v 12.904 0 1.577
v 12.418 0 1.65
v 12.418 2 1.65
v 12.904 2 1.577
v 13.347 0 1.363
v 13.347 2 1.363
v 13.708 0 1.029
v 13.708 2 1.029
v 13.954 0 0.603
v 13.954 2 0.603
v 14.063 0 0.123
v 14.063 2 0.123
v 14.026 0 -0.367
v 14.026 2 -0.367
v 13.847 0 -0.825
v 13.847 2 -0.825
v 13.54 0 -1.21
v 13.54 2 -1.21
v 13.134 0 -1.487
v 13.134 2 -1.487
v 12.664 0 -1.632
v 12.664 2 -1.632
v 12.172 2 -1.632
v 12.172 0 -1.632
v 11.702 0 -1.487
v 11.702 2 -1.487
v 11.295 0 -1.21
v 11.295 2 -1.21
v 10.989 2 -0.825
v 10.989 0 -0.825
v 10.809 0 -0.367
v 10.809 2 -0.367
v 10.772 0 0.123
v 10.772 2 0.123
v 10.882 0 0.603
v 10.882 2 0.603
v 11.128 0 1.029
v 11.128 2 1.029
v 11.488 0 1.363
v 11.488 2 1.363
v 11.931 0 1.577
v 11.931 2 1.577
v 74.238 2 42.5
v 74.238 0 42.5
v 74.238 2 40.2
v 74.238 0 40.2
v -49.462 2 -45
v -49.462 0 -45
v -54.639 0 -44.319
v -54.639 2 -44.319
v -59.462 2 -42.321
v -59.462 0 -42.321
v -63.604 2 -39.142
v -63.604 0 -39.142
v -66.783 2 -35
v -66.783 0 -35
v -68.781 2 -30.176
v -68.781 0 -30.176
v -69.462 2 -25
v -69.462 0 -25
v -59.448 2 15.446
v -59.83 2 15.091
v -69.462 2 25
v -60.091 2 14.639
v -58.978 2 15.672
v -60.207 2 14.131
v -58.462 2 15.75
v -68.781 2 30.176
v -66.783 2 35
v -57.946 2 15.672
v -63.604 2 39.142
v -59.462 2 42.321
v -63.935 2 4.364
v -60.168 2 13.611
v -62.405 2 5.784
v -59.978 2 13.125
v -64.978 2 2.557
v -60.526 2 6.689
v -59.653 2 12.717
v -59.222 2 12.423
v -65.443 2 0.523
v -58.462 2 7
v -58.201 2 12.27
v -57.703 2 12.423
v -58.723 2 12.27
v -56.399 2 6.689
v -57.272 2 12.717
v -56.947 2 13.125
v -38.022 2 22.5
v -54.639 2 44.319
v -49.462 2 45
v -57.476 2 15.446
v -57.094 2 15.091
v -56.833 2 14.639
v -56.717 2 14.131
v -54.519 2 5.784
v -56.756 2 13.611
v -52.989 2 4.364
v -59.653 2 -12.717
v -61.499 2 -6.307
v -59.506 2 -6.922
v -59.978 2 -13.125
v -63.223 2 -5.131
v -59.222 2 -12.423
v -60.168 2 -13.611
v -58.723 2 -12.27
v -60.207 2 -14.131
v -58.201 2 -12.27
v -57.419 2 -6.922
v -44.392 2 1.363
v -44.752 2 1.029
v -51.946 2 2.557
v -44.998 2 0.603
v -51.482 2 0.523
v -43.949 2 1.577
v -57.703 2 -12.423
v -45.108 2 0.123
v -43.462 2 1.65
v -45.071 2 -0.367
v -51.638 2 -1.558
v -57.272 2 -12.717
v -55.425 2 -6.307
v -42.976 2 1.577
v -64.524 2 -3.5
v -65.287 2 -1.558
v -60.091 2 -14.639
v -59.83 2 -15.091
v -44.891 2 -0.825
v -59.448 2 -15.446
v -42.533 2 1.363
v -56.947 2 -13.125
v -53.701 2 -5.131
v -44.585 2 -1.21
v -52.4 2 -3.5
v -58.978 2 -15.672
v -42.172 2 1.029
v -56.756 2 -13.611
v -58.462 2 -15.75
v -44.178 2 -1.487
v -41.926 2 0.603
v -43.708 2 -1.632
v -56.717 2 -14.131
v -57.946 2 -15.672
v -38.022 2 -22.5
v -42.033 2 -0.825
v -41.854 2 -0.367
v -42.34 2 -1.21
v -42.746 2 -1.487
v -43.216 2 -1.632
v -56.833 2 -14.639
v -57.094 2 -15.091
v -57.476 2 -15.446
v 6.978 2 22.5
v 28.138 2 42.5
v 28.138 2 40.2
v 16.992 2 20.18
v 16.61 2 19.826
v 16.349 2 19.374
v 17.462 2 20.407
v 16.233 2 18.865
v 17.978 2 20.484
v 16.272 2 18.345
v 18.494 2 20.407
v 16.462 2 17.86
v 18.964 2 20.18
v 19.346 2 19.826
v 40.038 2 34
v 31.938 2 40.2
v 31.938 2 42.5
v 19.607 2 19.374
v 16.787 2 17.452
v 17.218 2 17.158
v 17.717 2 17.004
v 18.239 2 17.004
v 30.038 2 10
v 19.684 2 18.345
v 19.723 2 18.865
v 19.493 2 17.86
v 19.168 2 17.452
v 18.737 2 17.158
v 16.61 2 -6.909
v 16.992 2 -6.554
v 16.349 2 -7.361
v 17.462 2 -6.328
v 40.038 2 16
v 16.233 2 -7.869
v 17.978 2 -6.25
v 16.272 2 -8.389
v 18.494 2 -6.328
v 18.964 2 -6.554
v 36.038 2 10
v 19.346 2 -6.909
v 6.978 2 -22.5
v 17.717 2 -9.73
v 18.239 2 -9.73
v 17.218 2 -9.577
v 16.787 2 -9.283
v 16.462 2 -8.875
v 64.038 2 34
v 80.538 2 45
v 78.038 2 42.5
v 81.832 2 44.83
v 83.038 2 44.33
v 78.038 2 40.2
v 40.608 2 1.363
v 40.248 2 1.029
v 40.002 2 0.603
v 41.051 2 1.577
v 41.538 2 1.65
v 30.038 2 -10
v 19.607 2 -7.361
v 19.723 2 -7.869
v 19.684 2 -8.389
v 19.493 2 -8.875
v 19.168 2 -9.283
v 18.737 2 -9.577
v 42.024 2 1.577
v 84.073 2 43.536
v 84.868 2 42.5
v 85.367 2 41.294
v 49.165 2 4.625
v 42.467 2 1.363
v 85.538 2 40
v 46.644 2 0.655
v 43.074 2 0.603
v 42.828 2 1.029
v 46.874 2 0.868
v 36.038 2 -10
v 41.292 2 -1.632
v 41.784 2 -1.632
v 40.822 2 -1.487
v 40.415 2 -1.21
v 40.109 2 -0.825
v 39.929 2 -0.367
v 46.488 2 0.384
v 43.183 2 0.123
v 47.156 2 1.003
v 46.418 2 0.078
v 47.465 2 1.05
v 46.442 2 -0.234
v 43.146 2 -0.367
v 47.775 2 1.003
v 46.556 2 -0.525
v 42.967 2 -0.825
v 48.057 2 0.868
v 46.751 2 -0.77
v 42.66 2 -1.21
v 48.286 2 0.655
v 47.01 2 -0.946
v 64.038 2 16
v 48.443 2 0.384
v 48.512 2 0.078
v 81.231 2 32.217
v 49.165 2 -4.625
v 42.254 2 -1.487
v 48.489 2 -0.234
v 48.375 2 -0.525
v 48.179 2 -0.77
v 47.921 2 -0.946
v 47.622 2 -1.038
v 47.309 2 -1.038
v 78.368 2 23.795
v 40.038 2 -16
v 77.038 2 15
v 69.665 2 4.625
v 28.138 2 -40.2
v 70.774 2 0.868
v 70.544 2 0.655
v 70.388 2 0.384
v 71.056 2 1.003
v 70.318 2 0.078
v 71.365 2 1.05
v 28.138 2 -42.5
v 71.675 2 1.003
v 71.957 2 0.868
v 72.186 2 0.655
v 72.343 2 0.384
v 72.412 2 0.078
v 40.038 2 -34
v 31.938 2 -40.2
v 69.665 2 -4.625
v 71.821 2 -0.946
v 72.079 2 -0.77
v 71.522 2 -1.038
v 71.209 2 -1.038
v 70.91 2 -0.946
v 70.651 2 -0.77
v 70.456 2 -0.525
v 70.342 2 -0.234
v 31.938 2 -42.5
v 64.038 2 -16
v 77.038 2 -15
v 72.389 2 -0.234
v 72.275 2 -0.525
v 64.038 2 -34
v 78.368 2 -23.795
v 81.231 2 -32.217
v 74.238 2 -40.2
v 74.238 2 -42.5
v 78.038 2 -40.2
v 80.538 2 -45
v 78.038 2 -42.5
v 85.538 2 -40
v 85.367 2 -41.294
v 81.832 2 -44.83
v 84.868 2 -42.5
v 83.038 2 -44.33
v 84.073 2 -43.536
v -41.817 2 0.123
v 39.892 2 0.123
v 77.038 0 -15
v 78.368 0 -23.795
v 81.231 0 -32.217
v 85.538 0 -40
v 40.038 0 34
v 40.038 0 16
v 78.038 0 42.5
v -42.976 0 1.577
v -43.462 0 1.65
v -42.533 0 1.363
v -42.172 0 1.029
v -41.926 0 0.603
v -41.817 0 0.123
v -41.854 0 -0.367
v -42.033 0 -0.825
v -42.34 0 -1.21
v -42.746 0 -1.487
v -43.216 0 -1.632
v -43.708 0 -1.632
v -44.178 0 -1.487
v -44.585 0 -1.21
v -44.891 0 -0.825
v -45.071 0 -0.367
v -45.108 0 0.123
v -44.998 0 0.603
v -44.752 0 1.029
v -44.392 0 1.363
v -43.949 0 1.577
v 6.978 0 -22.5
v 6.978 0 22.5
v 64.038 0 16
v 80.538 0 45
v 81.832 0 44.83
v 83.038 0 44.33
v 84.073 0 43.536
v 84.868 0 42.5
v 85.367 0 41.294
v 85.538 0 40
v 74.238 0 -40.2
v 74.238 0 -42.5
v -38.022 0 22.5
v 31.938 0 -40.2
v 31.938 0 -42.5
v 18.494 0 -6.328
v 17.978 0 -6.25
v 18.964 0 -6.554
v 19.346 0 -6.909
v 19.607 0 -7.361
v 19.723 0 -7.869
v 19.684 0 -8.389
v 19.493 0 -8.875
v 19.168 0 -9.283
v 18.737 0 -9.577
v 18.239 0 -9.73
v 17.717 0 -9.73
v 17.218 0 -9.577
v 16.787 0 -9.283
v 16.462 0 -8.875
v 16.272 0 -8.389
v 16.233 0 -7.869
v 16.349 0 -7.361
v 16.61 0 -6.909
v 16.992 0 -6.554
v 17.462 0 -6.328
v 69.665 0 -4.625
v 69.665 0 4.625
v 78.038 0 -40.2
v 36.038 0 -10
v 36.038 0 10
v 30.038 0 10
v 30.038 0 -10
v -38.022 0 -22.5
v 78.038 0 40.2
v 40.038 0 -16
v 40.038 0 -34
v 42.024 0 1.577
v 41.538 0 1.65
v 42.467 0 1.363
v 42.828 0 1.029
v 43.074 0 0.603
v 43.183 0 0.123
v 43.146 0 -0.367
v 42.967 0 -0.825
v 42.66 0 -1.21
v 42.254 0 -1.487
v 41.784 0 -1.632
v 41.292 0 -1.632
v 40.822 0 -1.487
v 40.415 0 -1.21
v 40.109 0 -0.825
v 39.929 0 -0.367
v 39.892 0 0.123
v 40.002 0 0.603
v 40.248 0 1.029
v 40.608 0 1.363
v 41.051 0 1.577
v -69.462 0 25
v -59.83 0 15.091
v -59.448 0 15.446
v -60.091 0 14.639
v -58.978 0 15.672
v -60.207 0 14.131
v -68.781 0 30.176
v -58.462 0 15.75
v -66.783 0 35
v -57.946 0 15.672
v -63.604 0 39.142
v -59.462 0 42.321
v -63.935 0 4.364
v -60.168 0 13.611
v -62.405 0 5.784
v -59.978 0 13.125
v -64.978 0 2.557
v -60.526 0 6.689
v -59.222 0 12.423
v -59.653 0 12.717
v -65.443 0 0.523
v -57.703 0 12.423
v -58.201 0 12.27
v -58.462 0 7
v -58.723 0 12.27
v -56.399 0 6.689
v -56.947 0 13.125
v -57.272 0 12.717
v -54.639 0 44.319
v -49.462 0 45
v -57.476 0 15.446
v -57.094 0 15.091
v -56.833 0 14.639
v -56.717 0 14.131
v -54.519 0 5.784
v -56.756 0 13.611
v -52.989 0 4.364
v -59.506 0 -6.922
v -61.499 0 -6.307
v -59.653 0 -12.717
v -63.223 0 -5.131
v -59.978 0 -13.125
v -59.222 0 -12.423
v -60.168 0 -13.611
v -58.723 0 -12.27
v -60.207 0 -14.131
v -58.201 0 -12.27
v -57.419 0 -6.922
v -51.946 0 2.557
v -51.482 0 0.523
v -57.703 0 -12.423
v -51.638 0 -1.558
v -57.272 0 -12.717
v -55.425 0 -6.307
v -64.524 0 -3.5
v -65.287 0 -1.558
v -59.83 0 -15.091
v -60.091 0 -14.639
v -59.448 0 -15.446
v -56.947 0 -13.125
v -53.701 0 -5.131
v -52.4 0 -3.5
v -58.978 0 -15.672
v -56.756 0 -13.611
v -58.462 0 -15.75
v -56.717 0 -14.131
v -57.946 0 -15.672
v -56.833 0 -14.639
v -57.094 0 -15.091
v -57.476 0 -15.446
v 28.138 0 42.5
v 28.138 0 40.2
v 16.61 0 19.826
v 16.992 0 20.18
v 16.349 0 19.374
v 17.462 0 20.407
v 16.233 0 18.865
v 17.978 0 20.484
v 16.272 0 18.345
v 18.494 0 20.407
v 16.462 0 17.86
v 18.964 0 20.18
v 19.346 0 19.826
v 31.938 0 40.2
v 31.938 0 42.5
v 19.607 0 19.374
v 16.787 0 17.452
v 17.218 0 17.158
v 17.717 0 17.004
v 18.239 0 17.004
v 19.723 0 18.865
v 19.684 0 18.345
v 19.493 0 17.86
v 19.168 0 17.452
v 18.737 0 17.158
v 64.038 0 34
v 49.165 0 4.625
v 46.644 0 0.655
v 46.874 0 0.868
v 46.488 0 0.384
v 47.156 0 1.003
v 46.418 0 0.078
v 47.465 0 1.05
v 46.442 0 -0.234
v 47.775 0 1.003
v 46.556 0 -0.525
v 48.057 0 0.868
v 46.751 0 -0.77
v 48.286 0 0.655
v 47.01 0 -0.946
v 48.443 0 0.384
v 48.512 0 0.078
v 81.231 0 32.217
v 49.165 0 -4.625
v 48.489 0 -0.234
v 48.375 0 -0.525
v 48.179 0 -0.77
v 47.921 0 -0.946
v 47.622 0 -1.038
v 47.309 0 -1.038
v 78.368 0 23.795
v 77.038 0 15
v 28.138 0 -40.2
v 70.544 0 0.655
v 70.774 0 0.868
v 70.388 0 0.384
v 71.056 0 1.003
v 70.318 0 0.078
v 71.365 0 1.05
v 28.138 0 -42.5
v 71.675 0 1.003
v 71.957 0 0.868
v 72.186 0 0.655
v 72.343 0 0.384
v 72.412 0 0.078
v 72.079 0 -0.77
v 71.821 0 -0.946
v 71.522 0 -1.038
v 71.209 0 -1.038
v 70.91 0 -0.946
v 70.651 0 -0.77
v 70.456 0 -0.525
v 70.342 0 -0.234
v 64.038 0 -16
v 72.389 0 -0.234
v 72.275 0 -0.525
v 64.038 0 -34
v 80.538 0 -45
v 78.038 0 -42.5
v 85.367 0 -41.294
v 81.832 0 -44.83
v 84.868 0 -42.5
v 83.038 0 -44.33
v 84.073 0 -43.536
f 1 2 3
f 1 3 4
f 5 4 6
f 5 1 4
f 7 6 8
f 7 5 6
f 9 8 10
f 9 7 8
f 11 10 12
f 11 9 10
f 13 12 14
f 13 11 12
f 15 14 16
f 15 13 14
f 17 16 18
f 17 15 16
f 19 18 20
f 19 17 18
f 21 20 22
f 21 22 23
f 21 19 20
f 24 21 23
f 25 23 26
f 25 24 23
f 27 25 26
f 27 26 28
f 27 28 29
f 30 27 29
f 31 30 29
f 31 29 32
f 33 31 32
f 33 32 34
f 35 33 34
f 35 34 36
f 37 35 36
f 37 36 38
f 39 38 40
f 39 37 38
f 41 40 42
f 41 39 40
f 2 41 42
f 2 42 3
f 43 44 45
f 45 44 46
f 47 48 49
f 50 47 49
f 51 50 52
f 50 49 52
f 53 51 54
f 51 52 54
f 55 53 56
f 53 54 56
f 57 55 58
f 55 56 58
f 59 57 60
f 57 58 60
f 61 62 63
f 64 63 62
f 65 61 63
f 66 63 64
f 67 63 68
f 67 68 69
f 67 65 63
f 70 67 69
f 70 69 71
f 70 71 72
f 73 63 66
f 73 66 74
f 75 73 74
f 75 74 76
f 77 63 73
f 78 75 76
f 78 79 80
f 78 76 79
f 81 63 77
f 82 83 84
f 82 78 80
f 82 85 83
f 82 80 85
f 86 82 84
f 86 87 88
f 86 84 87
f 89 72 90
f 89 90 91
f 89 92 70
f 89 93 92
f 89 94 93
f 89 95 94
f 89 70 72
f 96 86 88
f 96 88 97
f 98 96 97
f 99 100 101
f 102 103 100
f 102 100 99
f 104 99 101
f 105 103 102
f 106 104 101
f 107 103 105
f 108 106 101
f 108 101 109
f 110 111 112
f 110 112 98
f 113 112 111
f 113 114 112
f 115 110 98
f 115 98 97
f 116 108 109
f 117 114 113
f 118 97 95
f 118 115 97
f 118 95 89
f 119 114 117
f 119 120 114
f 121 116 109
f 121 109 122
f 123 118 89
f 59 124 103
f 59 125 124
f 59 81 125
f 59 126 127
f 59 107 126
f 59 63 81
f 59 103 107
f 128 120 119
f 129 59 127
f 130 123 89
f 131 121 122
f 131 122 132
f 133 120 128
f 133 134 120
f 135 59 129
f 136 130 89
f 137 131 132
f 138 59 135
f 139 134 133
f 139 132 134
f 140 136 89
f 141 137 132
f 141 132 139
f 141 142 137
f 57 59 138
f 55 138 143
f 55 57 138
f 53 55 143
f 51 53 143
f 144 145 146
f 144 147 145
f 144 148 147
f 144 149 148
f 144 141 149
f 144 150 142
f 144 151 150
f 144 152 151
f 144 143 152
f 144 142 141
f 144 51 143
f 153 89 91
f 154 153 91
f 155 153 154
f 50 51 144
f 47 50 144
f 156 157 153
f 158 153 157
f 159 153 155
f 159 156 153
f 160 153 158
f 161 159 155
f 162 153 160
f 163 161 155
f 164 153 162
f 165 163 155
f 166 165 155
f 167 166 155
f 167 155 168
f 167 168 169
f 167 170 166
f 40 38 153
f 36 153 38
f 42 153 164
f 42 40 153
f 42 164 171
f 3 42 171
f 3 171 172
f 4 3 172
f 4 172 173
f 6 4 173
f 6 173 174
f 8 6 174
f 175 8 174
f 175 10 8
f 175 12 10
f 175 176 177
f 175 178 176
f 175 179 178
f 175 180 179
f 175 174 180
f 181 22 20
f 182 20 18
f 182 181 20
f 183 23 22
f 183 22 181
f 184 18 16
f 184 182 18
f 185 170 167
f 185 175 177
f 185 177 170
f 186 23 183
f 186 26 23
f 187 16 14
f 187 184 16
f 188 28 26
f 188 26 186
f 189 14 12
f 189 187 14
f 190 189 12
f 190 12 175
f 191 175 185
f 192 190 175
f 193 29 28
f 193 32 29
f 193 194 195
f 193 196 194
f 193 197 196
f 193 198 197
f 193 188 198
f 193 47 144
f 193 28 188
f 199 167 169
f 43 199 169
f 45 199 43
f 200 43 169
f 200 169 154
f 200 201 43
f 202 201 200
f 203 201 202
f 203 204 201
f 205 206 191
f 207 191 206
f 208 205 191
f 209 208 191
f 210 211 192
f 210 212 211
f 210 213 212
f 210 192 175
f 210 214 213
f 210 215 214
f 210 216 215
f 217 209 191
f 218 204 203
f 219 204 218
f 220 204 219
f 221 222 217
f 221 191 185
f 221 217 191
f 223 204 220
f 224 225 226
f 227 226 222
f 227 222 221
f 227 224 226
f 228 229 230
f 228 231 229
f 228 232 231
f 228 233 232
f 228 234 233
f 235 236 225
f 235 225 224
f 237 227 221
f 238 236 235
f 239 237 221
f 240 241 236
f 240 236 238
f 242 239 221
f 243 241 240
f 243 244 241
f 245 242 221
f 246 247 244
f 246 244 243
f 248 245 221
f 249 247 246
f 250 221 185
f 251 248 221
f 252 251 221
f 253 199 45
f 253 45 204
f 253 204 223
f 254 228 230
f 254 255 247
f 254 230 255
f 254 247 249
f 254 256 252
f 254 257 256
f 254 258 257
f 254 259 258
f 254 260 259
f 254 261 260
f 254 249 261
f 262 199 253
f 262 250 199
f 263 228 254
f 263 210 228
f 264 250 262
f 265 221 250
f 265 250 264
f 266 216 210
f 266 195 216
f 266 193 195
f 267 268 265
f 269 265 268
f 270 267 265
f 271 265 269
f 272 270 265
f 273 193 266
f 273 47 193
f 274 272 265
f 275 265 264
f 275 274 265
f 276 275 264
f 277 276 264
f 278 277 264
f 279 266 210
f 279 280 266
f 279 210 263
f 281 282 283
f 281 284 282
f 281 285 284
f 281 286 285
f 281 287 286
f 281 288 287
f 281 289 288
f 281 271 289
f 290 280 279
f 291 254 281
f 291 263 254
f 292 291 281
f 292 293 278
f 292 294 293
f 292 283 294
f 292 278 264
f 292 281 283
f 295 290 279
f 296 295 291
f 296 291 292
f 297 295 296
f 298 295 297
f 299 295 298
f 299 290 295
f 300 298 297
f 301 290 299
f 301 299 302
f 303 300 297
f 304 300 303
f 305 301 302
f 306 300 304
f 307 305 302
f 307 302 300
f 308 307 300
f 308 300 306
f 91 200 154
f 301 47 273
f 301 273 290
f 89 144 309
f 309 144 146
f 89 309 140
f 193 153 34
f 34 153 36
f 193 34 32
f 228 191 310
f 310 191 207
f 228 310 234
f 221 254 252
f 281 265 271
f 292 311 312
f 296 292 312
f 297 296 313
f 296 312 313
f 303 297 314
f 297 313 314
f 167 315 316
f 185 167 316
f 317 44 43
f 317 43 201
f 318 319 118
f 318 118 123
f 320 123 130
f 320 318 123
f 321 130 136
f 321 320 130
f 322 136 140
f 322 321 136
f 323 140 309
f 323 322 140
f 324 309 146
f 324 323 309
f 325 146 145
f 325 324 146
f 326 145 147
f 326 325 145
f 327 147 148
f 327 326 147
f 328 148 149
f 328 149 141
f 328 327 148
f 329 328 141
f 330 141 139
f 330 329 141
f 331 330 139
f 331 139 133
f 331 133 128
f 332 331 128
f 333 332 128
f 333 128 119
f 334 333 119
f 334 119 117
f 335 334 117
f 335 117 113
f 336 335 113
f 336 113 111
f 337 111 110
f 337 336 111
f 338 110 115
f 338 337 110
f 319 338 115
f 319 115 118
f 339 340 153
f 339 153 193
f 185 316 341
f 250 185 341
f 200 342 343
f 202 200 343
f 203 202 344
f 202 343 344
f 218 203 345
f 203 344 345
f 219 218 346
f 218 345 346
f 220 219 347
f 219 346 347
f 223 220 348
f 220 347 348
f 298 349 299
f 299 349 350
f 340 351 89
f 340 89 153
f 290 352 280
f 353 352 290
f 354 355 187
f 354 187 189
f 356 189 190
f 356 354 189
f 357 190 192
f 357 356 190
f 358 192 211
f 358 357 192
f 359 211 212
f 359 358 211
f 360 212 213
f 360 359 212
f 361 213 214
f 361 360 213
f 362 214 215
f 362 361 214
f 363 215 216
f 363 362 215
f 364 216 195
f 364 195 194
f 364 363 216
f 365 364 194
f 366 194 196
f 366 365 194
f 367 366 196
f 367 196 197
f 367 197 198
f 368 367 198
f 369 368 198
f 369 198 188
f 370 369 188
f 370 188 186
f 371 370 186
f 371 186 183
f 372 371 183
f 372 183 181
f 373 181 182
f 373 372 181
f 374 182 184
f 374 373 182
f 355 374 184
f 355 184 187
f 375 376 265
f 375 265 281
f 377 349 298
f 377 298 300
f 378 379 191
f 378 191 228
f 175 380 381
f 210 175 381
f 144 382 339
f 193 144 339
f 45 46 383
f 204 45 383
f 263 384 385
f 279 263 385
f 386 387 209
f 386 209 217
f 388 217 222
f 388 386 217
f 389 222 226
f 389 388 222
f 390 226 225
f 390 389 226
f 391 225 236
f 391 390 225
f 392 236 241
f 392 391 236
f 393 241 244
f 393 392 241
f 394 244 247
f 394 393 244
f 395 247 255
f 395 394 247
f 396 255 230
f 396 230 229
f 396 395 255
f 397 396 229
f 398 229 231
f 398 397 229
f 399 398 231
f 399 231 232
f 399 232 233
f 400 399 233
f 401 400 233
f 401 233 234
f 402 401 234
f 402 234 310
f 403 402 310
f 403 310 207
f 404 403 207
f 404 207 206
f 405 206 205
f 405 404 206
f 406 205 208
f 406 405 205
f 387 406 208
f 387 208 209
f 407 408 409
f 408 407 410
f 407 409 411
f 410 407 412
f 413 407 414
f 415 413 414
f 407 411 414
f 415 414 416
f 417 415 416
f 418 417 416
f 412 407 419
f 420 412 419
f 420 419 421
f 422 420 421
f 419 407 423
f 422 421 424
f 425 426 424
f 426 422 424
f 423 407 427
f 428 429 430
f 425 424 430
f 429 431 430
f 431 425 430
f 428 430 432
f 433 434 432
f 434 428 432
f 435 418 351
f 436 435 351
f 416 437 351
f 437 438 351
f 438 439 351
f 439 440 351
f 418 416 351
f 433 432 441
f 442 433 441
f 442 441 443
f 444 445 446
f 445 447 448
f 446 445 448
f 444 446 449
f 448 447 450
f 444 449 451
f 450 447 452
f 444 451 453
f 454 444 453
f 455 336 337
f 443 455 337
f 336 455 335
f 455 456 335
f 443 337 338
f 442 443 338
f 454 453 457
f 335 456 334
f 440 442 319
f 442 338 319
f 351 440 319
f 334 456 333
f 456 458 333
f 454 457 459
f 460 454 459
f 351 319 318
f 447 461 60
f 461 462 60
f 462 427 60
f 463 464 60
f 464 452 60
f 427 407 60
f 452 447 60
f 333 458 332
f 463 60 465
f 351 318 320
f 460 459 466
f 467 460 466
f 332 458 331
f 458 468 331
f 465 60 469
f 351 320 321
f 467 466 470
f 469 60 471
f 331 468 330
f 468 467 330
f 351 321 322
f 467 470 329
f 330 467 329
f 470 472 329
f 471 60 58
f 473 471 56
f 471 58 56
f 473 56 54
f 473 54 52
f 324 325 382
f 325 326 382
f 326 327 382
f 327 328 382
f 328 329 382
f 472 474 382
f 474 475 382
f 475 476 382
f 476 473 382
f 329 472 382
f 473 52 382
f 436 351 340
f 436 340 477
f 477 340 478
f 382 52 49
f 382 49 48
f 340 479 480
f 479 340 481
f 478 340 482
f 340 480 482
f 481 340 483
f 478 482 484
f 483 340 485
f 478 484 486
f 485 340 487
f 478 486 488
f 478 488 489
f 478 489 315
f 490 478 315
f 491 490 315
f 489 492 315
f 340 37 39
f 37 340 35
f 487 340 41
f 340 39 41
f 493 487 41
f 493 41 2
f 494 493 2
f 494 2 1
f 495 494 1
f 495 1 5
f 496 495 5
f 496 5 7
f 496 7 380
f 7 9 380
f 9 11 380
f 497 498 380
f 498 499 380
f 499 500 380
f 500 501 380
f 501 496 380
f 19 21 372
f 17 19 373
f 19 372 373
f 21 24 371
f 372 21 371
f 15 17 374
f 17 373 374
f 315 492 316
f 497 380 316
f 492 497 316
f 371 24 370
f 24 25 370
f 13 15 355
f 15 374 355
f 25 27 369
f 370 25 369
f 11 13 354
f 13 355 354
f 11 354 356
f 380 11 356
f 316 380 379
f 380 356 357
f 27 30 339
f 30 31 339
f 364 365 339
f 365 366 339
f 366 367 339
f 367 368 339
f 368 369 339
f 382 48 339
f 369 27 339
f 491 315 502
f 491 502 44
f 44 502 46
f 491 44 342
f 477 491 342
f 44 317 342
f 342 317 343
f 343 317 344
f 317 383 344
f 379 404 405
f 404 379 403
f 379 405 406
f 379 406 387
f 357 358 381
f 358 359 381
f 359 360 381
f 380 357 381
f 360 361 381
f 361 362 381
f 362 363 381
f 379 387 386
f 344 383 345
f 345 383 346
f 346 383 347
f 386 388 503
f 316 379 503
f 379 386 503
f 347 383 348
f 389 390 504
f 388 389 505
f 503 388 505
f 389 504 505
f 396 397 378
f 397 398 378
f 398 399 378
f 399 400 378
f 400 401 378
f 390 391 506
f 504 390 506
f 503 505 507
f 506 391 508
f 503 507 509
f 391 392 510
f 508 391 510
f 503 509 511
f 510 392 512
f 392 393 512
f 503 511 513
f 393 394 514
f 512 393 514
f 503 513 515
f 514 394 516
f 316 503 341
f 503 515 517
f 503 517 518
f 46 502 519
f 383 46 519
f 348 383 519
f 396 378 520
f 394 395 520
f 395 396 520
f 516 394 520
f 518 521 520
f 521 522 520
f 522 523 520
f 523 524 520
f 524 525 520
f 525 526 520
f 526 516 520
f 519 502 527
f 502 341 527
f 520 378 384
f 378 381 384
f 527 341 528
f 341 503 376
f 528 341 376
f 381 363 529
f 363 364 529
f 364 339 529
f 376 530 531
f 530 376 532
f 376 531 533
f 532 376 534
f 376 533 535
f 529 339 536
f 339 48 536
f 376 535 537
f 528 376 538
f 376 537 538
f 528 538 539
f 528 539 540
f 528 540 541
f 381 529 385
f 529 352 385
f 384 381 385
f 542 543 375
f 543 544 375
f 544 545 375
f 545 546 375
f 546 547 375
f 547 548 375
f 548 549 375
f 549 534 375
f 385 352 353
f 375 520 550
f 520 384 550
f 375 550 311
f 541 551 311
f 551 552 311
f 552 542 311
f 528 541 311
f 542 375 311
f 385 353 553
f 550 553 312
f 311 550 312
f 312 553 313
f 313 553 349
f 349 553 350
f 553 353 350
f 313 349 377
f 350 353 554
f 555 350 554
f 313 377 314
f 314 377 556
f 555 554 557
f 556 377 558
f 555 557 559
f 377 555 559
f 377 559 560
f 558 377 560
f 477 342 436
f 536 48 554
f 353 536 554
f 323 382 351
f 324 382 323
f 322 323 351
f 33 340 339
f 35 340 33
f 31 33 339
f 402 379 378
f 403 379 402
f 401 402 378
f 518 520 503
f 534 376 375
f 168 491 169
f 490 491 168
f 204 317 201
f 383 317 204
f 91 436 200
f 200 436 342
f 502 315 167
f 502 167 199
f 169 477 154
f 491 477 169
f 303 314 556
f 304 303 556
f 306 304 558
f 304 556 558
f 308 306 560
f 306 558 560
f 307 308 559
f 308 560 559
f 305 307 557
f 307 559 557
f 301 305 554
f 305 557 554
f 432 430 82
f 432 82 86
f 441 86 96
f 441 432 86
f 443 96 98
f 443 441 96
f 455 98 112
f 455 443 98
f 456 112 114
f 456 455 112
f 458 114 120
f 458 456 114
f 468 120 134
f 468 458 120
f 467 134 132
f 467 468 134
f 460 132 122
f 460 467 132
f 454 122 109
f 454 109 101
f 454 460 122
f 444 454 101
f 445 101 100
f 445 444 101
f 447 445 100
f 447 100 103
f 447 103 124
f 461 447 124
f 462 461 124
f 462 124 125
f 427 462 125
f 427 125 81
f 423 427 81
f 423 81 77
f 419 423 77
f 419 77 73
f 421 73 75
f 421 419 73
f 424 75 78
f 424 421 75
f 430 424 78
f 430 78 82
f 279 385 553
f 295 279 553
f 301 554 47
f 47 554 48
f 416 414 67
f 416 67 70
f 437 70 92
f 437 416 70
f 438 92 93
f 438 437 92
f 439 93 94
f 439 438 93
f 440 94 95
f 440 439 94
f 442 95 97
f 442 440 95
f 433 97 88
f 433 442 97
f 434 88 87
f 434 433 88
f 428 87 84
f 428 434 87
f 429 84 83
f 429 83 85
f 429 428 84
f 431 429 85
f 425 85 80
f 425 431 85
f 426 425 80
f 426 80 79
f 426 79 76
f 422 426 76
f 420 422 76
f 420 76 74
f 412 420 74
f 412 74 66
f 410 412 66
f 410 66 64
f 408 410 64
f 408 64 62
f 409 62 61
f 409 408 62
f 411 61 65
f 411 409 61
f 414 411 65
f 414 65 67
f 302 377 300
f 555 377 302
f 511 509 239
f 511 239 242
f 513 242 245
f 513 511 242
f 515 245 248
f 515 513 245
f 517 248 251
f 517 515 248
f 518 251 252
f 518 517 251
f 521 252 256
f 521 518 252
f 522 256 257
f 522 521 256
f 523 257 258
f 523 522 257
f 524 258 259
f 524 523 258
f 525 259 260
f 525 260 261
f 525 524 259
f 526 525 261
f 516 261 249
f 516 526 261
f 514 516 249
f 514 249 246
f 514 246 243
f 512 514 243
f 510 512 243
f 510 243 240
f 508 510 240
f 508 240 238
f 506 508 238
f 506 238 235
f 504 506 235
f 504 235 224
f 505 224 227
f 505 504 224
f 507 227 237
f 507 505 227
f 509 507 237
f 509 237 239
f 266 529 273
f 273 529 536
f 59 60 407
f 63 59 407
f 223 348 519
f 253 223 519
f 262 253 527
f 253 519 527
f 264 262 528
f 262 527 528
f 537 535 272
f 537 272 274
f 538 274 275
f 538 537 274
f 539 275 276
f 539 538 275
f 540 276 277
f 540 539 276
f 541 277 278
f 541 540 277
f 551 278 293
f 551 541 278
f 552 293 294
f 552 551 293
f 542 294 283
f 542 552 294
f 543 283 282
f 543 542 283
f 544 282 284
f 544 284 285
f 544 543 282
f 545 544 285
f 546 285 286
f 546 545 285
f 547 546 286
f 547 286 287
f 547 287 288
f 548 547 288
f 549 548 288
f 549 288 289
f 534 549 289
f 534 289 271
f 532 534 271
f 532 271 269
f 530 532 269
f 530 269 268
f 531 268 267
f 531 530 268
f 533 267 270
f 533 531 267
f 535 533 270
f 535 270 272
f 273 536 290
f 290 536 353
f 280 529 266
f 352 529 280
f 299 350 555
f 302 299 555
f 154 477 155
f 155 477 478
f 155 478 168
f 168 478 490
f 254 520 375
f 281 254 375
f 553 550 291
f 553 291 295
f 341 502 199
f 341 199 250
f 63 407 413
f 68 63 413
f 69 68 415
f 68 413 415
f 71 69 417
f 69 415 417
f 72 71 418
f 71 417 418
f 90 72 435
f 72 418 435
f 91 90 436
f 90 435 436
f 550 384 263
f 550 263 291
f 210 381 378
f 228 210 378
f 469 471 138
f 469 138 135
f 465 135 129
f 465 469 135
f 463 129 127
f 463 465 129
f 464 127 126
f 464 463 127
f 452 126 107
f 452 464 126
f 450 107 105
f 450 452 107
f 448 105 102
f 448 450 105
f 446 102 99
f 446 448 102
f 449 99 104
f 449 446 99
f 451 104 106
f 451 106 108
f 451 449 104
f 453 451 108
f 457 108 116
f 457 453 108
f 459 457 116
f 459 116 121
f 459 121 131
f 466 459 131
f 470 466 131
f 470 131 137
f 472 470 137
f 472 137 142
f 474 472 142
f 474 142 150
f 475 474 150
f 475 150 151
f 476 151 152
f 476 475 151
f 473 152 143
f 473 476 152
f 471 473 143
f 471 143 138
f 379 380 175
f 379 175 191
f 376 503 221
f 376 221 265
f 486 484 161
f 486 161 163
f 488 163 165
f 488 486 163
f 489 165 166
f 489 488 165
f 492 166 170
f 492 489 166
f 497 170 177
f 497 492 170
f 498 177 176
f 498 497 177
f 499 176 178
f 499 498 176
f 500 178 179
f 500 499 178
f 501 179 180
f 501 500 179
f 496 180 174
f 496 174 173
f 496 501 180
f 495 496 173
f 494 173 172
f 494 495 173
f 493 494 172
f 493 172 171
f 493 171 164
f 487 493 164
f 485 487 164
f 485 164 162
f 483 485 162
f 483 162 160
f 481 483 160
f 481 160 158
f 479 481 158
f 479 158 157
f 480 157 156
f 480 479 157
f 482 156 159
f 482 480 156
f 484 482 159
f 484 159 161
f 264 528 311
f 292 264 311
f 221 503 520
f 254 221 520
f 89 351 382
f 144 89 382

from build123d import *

# Parameters (mm, degrees)
CROQUIS1_R              = 1.75
CROQUIS1_R_2            = 1.05
CROQUIS1_R_3            = 1.65
CROQUIS1_R_4            = 7
CROQUIS1_W              = 24
CROQUIS1_H              = 18
CROQUIS1_W_2            = 20.5
CROQUIS1_H_2            = 9.25
CROQUIS1_W_3            = 3.8
CROQUIS1_H_3            = 2.3
CROQUIS1_W_4            = 6
CROQUIS1_H_4            = 20
CROQUIS1_W_5            = 45
CROQUIS1_H_5            = 45
SALIENTE_EXTRUIR1_DEPTH = 2


with BuildPart() as part:
    # Croquis1 → Saliente-Extruir1 (new body)
    with BuildSketch(Plane(origin=(0, 0, 0), x_dir=(1, 0, 0), z_dir=(0, 1, 0))):
        with BuildLine():
            Line((-49.462248263, -45), (80.537751737, -45))
            ThreePointArc((80.537751737, -45), (84.073285643, -43.535533906), (85.537751737, -40))
            ThreePointArc((85.537751737, -40), (79.612228902, -28.069677764), (77.037751737, -15))
            Line((77.037751737, -15), (77.037751737, 15))
            ThreePointArc((77.037751737, 15), (79.612228902, 28.069677764), (85.537751737, 40))
            ThreePointArc((85.537751737, 40), (84.073285643, 43.535533906), (80.537751737, 45))
            Line((80.537751737, 45), (-49.462248263, 45))
            ThreePointArc((-49.462248263, 45), (-63.604383887, 39.142135624), (-69.462248263, 25))
            Line((-69.462248263, 25), (-69.462248263, -25))
            ThreePointArc((-69.462248263, -25), (-63.604383887, -39.142135624), (-49.462248263, -45))
        make_face()
        with Locations(Location((-58.462248263, -14, 0), (0, 0, 270))):
            Circle(CROQUIS1_R, mode=Mode.SUBTRACT)
        with Locations(Location((-58.462248263, 14, 0), (0, 0, 90))):
            Circle(CROQUIS1_R, mode=Mode.SUBTRACT)
        with Locations(Location((71.365251737, 0, 0), (0, 0, 270))):
            Circle(CROQUIS1_R_2, mode=Mode.SUBTRACT)
        with Locations(Location((47.465251737, 0, 0), (0, 0, 270))):
            Circle(CROQUIS1_R_2, mode=Mode.SUBTRACT)
        with Locations(Location((-43.462248263, 0, 0), (0, 0, 270))):
            Circle(CROQUIS1_R_3, mode=Mode.SUBTRACT)
        with Locations(Location((12.417751737, 0, 0), (0, 0, 270))):
            Circle(CROQUIS1_R_3, mode=Mode.SUBTRACT)
        with Locations(Location((-58.462248263, 0, 0), (0, 0, 270))):
            Circle(CROQUIS1_R_4, mode=Mode.SUBTRACT)
        with Locations(Location((41.537751737, 0, 0), (0, 0, 270))):
            Circle(CROQUIS1_R_3, mode=Mode.SUBTRACT)
        with Locations(Location((17.977751737, 8, 0), (0, 0, 270))):
            Circle(CROQUIS1_R, mode=Mode.SUBTRACT)
        with Locations(Location((17.977751737, -18.7345, 0), (0, 0, 270))):
            Circle(CROQUIS1_R, mode=Mode.SUBTRACT)
        with Locations((52.037751737, -25)):
            Rectangle(CROQUIS1_W, CROQUIS1_H, mode=Mode.SUBTRACT)
        with Locations((59.415251737, 0)):
            Rectangle(CROQUIS1_W_2, CROQUIS1_H_2, mode=Mode.SUBTRACT)
        with Locations((30.037751737, 41.35)):
            Rectangle(CROQUIS1_W_3, CROQUIS1_H_3, mode=Mode.SUBTRACT)
        with Locations((76.137751737, 41.35)):
            Rectangle(CROQUIS1_W_3, CROQUIS1_H_3, mode=Mode.SUBTRACT)
        with Locations((76.137751737, -41.35)):
            Rectangle(CROQUIS1_W_3, CROQUIS1_H_3, mode=Mode.SUBTRACT)
        with Locations((30.037751737, -41.35)):
            Rectangle(CROQUIS1_W_3, CROQUIS1_H_3, mode=Mode.SUBTRACT)
        with Locations((33.037751737, 0)):
            Rectangle(CROQUIS1_W_4, CROQUIS1_H_4, mode=Mode.SUBTRACT)
        with Locations((-15.522248263, 0)):
            Rectangle(CROQUIS1_W_5, CROQUIS1_H_5, mode=Mode.SUBTRACT)
        with Locations((52.037751737, 25)):
            Rectangle(CROQUIS1_W, CROQUIS1_H, mode=Mode.SUBTRACT)
    extrude(amount=SALIENTE_EXTRUIR1_DEPTH)


solid = part.part
